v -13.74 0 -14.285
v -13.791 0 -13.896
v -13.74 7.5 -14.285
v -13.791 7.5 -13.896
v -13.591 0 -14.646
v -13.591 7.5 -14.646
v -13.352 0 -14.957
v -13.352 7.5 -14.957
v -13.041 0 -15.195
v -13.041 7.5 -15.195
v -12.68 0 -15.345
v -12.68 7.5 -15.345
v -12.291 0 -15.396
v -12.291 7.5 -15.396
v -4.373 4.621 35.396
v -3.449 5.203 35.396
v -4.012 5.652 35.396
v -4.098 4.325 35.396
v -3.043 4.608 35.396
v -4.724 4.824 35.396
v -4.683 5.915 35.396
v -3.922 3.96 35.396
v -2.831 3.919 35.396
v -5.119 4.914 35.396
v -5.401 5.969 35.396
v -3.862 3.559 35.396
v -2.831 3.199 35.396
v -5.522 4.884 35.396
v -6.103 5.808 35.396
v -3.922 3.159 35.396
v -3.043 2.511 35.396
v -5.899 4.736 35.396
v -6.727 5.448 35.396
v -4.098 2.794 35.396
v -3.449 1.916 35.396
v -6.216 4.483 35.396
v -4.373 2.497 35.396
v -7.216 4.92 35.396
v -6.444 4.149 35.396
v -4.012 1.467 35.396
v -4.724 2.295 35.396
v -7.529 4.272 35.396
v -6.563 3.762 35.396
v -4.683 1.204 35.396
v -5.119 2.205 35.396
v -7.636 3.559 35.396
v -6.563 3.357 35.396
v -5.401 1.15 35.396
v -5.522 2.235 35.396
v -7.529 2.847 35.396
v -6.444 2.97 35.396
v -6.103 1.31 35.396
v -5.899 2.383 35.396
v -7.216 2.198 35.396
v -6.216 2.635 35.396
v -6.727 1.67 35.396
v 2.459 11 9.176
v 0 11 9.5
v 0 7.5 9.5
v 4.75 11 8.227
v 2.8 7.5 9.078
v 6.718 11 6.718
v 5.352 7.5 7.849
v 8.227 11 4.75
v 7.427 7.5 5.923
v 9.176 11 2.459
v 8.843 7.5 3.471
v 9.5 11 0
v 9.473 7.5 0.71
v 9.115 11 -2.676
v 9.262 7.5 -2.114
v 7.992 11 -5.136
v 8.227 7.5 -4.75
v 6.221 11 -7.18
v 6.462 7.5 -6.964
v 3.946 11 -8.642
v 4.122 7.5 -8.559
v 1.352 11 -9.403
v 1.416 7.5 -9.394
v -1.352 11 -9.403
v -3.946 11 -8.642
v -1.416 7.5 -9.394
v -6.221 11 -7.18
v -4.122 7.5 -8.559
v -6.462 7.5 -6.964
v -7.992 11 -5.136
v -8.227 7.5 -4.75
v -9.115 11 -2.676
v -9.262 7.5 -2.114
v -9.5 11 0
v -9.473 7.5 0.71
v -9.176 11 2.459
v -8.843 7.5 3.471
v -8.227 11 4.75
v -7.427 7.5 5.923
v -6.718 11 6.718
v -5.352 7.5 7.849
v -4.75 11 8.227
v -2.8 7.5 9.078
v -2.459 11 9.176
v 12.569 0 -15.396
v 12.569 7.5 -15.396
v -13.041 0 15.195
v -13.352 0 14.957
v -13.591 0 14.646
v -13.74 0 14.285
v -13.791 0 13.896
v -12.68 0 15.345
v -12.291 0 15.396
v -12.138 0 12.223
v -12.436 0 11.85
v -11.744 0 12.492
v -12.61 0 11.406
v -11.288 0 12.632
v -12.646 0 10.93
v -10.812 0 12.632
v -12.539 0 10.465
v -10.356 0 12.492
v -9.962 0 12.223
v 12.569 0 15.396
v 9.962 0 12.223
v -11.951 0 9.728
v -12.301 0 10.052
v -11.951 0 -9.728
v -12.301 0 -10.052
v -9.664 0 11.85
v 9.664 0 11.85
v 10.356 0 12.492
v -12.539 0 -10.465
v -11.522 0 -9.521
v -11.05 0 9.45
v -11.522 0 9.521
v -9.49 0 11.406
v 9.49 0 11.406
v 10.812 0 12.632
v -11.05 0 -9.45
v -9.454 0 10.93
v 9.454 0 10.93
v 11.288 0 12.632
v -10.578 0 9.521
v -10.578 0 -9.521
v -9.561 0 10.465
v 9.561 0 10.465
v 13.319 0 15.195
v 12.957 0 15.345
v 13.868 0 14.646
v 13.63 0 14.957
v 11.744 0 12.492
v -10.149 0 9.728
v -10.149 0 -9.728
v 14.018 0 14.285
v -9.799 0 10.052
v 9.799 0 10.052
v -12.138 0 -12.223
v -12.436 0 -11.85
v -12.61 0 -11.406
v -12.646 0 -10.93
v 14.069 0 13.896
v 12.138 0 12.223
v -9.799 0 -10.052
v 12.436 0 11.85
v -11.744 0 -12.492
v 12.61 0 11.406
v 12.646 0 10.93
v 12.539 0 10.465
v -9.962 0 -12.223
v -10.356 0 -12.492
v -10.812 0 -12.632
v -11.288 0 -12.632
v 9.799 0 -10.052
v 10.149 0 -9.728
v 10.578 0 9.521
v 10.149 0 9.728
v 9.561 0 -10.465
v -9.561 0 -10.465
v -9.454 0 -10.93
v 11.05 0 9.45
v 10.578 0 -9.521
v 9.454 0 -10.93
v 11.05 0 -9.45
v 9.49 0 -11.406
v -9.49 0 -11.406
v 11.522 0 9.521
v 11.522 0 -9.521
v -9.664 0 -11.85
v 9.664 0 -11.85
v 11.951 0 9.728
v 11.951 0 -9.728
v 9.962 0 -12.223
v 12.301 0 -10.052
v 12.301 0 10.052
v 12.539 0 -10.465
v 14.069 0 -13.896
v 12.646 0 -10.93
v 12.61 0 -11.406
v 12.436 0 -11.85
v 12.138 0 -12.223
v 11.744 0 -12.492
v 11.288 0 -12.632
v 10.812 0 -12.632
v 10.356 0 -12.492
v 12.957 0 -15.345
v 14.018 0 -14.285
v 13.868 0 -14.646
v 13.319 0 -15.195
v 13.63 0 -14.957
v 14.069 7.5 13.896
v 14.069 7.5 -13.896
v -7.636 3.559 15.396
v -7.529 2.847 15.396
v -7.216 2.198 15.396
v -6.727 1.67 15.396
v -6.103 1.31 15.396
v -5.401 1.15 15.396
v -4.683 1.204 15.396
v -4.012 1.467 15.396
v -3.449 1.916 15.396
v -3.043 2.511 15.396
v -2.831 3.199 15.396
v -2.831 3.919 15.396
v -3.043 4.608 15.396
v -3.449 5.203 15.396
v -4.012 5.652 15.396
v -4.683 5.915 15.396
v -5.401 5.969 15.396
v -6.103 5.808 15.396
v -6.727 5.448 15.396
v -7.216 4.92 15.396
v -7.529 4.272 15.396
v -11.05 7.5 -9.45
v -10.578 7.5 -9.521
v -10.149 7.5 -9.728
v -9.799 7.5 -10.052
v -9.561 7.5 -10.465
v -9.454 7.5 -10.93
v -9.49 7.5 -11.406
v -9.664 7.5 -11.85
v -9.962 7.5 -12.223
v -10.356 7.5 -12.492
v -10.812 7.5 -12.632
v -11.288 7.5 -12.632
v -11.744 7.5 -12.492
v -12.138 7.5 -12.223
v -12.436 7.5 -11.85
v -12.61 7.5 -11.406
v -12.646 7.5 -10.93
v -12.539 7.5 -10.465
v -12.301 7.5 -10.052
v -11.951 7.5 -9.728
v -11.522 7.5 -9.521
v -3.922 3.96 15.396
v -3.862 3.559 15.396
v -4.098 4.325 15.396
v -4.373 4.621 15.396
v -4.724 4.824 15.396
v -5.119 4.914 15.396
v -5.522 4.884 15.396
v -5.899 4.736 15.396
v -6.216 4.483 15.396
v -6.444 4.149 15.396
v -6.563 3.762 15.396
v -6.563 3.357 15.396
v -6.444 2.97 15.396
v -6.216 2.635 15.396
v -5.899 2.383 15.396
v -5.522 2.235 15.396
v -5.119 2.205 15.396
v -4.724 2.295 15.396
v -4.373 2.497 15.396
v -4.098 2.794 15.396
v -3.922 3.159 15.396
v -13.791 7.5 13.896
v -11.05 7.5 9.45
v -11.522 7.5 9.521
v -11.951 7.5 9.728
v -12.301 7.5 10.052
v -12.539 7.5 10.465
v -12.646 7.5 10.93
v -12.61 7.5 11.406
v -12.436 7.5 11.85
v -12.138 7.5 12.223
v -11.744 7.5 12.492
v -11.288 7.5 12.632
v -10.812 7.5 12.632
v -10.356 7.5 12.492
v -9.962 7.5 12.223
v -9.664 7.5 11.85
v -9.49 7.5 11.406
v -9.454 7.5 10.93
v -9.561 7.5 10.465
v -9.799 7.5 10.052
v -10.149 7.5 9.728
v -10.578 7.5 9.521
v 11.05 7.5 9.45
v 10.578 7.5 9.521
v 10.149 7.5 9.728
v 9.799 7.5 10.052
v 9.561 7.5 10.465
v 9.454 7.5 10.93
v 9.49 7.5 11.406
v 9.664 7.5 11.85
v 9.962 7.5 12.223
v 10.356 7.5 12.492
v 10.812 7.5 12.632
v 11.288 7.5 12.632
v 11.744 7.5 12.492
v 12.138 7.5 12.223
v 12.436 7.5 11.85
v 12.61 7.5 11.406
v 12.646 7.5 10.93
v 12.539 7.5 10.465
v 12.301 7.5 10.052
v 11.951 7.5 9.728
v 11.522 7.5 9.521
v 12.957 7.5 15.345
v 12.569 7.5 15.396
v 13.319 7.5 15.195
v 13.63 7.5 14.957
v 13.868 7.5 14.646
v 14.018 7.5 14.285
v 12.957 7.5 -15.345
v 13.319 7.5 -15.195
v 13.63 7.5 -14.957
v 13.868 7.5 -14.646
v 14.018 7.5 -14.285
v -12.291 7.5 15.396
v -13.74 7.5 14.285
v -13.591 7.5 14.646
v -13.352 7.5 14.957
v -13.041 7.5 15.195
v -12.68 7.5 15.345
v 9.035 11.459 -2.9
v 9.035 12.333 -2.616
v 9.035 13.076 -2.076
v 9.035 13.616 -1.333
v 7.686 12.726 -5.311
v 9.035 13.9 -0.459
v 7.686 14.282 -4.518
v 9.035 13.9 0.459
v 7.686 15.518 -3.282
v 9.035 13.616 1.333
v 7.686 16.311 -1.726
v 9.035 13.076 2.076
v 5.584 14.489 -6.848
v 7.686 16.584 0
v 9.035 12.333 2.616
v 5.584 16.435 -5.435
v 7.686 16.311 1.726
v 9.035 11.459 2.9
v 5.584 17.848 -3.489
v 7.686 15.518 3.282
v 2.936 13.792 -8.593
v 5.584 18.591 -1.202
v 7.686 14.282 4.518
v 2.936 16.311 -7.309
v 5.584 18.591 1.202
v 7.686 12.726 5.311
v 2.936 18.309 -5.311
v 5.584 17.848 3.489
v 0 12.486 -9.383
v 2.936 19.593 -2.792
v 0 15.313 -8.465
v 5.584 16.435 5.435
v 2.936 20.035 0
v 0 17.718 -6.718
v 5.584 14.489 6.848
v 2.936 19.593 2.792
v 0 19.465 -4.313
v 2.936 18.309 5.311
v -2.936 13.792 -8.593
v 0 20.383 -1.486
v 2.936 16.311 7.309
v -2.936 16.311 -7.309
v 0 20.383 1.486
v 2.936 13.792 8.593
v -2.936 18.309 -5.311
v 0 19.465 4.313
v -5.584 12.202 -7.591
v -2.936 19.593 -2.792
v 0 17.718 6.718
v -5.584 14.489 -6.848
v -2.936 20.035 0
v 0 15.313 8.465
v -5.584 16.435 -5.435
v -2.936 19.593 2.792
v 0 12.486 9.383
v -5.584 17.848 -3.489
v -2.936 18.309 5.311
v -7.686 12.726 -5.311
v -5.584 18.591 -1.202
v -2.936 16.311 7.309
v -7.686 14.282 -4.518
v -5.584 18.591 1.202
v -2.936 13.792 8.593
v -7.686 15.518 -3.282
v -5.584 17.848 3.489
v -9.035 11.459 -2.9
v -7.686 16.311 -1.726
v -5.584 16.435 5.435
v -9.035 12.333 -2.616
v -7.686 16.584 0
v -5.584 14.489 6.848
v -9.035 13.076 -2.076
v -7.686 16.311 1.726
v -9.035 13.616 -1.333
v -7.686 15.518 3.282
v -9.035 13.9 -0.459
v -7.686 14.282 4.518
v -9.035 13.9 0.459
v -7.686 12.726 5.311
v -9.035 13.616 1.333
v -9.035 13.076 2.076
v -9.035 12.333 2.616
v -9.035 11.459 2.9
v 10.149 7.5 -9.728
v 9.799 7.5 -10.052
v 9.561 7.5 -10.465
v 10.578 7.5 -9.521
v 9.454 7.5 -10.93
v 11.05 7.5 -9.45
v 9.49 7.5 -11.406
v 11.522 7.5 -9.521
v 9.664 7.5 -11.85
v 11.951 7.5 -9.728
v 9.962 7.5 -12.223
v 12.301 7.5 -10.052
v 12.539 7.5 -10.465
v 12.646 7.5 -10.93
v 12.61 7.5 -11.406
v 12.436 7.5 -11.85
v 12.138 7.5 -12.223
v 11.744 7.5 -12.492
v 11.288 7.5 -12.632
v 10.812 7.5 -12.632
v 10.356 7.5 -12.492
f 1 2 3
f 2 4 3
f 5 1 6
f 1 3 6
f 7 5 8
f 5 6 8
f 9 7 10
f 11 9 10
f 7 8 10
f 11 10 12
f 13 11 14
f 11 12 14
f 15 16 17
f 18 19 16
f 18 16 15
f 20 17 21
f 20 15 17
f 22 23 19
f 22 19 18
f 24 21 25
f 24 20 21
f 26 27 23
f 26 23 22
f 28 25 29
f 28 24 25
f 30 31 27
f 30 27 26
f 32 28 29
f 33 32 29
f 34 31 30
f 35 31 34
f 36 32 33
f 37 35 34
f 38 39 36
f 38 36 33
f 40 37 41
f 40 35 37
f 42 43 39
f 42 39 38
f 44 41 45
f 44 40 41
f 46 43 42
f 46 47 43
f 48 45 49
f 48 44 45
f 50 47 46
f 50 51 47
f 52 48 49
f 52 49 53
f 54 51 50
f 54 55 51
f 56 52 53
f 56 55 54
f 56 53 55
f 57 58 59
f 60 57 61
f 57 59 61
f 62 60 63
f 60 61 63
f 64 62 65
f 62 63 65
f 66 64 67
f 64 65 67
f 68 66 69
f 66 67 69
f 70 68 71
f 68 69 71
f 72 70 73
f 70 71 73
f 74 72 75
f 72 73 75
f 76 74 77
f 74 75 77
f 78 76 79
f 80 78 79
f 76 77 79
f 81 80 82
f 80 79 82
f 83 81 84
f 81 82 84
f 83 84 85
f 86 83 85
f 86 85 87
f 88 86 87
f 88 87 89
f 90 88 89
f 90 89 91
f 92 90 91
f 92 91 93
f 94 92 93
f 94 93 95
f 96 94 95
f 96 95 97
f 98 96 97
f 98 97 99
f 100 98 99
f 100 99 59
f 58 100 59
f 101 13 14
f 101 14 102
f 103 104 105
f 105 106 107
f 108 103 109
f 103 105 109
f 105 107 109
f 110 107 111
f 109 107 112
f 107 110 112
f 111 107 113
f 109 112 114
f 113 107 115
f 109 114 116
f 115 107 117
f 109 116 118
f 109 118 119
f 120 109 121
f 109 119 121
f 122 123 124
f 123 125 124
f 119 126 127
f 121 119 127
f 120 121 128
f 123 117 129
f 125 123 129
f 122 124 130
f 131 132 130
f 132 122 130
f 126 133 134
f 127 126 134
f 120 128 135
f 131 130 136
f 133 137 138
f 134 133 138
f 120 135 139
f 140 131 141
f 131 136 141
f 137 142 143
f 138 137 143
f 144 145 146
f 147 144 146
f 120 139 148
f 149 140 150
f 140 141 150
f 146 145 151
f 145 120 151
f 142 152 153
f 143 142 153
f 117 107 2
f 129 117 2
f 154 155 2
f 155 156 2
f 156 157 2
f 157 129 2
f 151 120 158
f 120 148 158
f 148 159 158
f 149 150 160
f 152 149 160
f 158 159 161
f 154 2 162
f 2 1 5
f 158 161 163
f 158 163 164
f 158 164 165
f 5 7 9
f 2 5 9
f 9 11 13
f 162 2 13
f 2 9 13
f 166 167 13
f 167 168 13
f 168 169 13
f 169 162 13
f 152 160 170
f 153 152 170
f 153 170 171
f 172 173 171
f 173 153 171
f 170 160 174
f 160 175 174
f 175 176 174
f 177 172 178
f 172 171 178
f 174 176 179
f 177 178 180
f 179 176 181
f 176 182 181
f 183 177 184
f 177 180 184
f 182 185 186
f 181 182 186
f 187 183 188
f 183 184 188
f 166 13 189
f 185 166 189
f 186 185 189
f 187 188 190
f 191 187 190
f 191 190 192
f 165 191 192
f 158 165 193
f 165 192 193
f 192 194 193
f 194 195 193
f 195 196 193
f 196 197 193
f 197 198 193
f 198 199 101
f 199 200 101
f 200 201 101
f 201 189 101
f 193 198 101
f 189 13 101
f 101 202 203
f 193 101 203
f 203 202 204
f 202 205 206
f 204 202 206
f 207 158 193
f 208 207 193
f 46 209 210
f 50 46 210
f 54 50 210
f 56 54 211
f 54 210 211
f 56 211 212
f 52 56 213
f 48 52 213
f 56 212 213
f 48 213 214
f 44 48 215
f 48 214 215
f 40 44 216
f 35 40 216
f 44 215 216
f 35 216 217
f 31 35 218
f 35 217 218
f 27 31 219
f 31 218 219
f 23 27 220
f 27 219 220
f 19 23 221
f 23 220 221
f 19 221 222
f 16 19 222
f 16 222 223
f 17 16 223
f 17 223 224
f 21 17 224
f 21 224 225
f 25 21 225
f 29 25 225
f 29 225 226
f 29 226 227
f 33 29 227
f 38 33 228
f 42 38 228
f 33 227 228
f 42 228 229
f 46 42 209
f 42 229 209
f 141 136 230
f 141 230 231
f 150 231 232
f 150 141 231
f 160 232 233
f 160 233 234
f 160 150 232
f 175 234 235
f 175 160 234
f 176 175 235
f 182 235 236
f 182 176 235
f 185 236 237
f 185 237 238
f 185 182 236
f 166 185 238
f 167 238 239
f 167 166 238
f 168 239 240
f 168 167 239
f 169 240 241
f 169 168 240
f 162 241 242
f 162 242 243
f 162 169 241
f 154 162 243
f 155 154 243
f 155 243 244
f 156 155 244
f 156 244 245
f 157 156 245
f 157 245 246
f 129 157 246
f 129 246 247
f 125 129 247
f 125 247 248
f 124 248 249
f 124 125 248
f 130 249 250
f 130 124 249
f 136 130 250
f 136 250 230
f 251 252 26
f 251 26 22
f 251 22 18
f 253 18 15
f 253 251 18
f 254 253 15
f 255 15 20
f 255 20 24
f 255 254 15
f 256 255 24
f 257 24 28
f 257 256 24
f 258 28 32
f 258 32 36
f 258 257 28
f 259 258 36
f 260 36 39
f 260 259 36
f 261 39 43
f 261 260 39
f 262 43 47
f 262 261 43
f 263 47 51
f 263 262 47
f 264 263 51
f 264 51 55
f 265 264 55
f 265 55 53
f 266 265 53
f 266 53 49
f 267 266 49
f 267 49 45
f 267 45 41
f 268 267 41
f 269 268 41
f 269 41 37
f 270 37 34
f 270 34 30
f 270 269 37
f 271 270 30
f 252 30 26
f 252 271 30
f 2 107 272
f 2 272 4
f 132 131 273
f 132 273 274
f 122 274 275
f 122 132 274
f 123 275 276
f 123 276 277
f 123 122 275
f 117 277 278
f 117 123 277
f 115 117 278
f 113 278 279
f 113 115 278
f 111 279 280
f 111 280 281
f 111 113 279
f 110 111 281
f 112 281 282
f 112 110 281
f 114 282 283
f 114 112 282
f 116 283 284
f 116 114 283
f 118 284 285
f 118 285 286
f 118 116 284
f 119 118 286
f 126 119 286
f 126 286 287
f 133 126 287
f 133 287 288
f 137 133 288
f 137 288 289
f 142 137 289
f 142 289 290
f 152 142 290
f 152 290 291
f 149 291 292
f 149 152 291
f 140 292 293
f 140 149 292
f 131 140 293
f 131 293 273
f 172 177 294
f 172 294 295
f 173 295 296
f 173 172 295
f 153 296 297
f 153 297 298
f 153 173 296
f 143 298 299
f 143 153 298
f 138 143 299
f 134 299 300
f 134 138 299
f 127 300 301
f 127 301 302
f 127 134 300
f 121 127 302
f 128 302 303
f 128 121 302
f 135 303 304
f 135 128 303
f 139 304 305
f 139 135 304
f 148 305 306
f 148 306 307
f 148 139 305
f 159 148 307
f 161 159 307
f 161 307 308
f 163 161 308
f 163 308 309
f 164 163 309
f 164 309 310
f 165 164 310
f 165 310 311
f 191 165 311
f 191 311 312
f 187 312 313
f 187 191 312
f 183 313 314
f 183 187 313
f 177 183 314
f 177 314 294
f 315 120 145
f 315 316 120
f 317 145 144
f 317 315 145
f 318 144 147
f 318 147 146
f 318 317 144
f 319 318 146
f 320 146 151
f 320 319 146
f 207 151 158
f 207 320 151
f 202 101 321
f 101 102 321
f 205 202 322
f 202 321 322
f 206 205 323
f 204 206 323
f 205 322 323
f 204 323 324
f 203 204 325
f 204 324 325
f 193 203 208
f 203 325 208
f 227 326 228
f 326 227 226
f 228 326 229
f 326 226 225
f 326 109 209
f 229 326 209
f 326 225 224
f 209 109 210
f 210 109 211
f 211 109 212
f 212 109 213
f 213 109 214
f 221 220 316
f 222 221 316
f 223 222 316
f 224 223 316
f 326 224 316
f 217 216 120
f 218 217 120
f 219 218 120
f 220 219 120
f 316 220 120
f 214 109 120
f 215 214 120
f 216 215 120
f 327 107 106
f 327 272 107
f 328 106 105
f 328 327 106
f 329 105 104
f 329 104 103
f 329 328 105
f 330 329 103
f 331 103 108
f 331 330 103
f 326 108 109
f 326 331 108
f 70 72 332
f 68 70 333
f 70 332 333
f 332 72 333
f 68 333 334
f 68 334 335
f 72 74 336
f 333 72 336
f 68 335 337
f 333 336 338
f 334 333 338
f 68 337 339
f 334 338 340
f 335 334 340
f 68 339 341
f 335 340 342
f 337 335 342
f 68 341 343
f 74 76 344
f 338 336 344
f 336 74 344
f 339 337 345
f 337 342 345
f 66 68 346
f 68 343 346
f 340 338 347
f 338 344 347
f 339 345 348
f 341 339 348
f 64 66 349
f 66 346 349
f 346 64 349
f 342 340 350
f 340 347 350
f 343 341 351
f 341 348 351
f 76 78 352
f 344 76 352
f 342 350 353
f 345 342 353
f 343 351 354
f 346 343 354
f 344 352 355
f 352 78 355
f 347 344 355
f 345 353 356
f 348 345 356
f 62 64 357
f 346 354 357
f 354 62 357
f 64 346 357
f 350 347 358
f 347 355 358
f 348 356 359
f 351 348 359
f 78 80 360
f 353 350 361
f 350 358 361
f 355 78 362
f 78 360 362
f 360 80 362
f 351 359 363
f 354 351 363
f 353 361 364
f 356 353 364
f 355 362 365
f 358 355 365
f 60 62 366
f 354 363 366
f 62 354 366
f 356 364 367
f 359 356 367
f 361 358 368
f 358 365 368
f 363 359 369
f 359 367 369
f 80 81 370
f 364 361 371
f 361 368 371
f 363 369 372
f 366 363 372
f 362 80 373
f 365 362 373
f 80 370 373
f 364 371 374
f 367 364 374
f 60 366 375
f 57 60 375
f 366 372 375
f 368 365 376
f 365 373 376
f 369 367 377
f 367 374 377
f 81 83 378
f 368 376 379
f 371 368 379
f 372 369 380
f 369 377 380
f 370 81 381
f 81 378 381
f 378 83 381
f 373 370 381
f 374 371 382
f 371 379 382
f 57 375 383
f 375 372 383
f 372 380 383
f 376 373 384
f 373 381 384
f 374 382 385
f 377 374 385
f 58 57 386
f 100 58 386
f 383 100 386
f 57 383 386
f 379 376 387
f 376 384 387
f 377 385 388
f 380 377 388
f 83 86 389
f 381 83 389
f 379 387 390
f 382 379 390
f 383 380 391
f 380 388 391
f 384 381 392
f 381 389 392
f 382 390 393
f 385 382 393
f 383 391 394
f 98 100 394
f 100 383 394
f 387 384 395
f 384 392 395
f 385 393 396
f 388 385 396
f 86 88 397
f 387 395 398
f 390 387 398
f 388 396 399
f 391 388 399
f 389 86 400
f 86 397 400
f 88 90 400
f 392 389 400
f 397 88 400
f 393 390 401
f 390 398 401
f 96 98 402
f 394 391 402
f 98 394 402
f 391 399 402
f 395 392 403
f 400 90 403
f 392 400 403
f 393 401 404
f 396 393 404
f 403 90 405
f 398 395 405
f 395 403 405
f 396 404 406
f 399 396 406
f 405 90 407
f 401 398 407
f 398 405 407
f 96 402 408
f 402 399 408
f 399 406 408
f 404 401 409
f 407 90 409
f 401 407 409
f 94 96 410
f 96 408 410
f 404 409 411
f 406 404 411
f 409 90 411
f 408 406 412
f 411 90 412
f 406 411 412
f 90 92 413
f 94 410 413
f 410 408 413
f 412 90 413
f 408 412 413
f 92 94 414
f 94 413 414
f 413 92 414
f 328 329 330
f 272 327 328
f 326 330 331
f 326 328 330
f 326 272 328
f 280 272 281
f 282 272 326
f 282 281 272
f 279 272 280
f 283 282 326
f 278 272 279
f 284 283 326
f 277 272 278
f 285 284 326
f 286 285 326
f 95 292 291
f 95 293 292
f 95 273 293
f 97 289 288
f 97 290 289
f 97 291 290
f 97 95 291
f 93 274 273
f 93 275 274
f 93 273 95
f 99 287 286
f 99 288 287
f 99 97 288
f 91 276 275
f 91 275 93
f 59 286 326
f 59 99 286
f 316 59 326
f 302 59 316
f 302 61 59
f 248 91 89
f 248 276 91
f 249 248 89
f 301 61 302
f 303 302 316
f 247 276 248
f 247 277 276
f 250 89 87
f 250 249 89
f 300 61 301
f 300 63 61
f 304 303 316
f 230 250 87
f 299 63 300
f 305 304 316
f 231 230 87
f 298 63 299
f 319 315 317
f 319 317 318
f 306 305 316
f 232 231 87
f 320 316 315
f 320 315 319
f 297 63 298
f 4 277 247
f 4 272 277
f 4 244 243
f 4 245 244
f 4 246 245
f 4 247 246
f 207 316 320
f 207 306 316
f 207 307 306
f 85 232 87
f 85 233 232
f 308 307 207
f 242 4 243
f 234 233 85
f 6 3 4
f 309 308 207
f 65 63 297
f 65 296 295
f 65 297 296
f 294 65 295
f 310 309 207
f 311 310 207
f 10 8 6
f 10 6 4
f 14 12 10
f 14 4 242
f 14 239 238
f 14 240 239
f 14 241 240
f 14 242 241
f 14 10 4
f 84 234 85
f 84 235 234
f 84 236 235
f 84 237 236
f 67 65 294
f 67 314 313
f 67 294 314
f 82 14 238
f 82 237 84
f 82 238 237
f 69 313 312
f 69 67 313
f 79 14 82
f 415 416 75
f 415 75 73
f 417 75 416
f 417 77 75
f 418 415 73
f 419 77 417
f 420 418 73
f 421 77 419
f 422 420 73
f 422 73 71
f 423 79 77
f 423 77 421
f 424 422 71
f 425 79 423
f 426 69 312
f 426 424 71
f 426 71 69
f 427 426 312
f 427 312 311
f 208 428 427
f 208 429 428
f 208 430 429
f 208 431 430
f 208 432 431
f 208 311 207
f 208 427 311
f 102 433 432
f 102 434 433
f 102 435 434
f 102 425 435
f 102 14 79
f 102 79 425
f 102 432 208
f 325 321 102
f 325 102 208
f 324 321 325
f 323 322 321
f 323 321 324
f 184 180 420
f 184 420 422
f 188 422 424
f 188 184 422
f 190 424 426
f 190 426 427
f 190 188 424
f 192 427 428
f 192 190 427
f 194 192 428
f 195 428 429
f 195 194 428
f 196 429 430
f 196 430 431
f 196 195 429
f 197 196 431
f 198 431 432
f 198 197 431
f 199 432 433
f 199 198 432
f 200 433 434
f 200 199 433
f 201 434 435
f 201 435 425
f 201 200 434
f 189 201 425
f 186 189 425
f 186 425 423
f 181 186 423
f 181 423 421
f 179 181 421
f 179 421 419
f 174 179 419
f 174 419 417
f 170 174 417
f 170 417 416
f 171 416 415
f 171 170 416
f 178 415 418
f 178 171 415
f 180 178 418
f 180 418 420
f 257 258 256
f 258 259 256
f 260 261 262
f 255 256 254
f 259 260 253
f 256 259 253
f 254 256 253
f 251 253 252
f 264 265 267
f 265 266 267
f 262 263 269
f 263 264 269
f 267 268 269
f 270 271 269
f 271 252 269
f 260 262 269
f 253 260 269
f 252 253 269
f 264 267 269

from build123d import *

# Parameters (mm, degrees)
SKETCH1_W           = 27.860395724
SKETCH1_H           = 30.792543072
SKETCH1_R           = 1.6
BOSS_EXTRUDE1_DEPTH = 7.5
SKETCH2_R           = 9.5
BOSS_EXTRUDE2_DEPTH = 3.5
REVOLVE3_ANGLE      = 180
FILLET1_R           = 1.5
SKETCH4_R           = 2.416047387
SKETCH4_R_2         = 1.358434459
BOSS_EXTRUDE3_DEPTH = 20


with BuildPart() as part:
    # Sketch1 → Boss-Extrude1 (new body)
    with BuildSketch(Plane(origin=(0, 0, 0), x_dir=(1, 0, 0), z_dir=(0, 1, 0))):
        with Locations((0.138729437, 0)):
            Rectangle(SKETCH1_W, SKETCH1_H)
        with Locations(Location((-11.05, 11.05, 0), (0, 0, 270))):
            Circle(SKETCH1_R, mode=Mode.SUBTRACT)
        with Locations(Location((11.05, 11.05, 0), (0, 0, 270))):
            Circle(SKETCH1_R, mode=Mode.SUBTRACT)
        with Locations(Location((-11.05, -11.05, 0), (0, 0, 90))):
            Circle(SKETCH1_R, mode=Mode.SUBTRACT)
        with Locations(Location((11.05, -11.05, 0), (0, 0, 90))):
            Circle(SKETCH1_R, mode=Mode.SUBTRACT)
    extrude(amount=BOSS_EXTRUDE1_DEPTH)

    # Sketch2 → Boss-Extrude2 (add)
    with BuildSketch(Plane(origin=(0, 7.5, 0), x_dir=(1, 0, 0), z_dir=(0, 1, 0))):
        with Locations(Location((0, 0, 0), (0, 0, 270))):
            Circle(SKETCH2_R)
    extrude(amount=BOSS_EXTRUDE2_DEPTH)

    # Sketch3 → Revolve3 (revolve)
    with BuildSketch(Plane(origin=(0, 11, 0), x_dir=(1, 0, 0), z_dir=(0, 1, 0))):
        with BuildLine():
            Line((-9.5, 0), (9.5, 0))
            ThreePointArc((9.5, 0), (0, 9.5), (-9.5, 0))
        make_face()
    revolve(axis=Axis((-9.5, 11, 0), (1, 0, 0)), revolution_arc=REVOLVE3_ANGLE)

    # Fillet1
    fillet1_edges = [part.edges().sort_by_distance(p)[0] for p in [
        (-13.791468425, 3.75, -15.396271536),
        (14.068927299, 3.75, -15.396271536),
        (14.068927299, 3.75, 15.396271536),
        (-13.791468425, 3.75, 15.396271536),
    ]]
    fillet(fillet1_edges, radius=FILLET1_R)

    # Sketch4 → Boss-Extrude3 (add)
    with BuildSketch(Plane.XY.offset(15.396271536)):
        with Locations(Location((-5.220214875, 3.559374136, 0), (0, 0, 180))):
            Circle(SKETCH4_R)
        with Locations((-5.220214875, 3.559374136)):
            Circle(SKETCH4_R_2, mode=Mode.SUBTRACT)
    extrude(amount=BOSS_EXTRUDE3_DEPTH)


solid = part.part
